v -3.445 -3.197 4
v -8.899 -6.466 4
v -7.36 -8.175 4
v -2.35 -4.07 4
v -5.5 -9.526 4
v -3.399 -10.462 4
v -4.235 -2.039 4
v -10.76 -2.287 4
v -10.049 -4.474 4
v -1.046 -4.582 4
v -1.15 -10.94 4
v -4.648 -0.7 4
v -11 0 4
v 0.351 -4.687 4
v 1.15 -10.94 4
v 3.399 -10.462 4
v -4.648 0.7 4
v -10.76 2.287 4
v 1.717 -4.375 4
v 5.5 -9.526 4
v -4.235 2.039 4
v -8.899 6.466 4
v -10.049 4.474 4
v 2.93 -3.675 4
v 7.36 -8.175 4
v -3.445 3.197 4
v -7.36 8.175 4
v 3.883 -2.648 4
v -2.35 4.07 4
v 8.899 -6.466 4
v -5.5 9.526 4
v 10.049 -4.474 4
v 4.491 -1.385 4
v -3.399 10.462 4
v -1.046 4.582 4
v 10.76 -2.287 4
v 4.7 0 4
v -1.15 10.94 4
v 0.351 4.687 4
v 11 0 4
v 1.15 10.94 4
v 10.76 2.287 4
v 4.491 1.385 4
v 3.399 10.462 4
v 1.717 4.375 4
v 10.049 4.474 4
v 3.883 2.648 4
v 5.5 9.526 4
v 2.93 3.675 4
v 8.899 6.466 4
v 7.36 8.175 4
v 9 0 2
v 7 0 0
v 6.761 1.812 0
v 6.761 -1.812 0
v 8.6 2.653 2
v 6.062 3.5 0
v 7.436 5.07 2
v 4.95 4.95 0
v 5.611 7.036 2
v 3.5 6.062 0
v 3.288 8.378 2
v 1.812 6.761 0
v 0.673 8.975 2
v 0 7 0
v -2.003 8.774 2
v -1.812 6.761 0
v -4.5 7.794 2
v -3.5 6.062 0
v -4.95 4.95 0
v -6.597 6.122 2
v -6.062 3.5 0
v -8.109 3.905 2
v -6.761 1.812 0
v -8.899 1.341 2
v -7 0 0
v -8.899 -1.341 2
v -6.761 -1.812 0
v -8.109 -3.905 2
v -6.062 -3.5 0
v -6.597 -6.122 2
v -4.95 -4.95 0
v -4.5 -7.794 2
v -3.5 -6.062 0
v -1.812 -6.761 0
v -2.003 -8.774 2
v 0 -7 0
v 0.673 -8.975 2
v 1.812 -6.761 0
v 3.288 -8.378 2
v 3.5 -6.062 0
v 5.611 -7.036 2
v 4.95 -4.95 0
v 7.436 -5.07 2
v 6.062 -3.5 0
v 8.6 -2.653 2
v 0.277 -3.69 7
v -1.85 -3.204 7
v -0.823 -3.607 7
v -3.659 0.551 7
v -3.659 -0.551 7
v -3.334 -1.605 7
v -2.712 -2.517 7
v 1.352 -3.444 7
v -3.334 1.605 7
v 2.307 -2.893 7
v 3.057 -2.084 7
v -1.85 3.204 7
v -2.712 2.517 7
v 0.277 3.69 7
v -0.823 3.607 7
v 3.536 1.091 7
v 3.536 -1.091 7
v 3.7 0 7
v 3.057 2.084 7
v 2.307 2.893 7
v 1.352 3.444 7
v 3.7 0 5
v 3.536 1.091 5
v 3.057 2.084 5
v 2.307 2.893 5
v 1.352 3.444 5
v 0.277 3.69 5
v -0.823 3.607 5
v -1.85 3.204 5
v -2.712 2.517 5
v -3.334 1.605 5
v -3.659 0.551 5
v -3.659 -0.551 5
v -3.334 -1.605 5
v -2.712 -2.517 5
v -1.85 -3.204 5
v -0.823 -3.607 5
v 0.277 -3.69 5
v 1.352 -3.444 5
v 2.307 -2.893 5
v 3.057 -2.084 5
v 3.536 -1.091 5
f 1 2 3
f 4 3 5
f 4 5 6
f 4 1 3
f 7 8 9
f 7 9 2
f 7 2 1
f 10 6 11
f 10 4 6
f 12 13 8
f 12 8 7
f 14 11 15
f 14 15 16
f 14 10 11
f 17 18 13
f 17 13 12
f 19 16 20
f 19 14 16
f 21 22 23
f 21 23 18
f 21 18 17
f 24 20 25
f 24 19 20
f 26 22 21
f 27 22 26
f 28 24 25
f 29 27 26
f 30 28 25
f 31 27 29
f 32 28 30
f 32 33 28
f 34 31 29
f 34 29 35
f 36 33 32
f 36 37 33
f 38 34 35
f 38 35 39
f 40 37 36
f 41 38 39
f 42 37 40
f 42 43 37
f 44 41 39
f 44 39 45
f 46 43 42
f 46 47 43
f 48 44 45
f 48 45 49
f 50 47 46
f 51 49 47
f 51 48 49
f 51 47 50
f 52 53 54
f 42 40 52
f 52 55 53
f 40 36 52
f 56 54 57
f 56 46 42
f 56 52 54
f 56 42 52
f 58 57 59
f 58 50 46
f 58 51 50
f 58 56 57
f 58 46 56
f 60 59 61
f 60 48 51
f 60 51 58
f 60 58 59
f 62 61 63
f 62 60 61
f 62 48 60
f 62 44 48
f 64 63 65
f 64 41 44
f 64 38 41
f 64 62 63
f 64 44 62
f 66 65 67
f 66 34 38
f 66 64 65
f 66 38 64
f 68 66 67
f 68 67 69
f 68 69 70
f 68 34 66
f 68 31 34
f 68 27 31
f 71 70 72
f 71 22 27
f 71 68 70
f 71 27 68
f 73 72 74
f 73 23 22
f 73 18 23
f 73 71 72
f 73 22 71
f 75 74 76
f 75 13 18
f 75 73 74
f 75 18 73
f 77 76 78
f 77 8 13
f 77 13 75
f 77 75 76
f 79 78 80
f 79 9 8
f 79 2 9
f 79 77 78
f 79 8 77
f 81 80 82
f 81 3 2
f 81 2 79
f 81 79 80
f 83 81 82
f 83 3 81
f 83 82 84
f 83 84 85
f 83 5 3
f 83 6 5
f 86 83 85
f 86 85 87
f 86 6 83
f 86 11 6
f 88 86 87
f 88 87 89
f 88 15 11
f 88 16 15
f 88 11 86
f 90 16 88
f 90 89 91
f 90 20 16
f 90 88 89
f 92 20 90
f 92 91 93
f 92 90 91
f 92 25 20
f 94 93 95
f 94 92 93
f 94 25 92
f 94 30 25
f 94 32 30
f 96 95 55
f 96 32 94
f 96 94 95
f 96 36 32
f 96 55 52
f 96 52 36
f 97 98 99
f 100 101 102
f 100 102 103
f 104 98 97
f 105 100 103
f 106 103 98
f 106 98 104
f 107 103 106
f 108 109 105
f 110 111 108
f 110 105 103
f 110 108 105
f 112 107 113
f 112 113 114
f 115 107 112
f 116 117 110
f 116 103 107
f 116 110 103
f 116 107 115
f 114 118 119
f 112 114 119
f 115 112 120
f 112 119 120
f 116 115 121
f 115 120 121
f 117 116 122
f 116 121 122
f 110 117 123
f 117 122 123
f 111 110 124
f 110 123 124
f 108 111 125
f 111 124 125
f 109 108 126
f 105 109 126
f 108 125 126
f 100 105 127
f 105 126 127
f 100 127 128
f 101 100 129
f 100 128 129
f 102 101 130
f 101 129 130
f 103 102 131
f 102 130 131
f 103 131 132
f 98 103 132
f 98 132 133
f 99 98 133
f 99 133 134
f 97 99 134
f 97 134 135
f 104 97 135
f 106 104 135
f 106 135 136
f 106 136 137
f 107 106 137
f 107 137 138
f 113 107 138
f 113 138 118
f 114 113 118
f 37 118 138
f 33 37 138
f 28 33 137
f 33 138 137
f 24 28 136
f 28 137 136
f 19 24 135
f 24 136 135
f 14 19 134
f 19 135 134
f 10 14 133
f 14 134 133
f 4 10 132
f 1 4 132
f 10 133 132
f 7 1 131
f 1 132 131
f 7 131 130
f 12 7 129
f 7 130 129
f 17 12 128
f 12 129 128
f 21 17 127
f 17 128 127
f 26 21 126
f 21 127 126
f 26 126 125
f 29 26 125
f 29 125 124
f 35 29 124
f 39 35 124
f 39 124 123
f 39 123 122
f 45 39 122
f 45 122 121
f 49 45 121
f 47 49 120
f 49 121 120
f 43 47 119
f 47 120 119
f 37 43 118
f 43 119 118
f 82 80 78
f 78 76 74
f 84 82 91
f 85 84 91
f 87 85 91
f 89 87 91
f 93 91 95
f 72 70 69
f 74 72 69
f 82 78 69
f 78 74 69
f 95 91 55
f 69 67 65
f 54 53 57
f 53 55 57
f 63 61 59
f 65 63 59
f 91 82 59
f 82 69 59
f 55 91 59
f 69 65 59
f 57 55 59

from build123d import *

# Parameters (mm, degrees)
F0_R     = 11
F0_R_2   = 3.7
F1_DEPTH = 4
F2_DEPTH = 7
F3_SIZE  = 3.99999
F4_SIZE  = 1


# Not quite as in the source:
# - a fillet or chamfer is up to 0.001 mm smaller than in the source, because OpenCascade refuses the exact size


with BuildPart() as f1:
    # F0 (on Top) → F1 (new body)
    with BuildSketch(Plane.XY):
        Circle(F0_R)
        Circle(F0_R_2, mode=Mode.SUBTRACT)
        Circle(F0_R_2)
    extrude(amount=F1_DEPTH)

    # F0 (on Top) → F2 (join)
    with BuildSketch(Plane.XY):
        Circle(F0_R_2)
    extrude(amount=F2_DEPTH)

    # F3 (size 4 in the source; OpenCascade refuses exactly that, so slightly less here)
    f3_edges = [f1.edges().sort_by_distance(p)[0] for p in [
        (-11, 0, 0),
    ]]
    chamfer(f3_edges, length=F3_SIZE)

    # F4
    f4_edges = [f1.edges().sort_by_distance(p)[0] for p in [
        (-3.7, 0, 4),
    ]]
    chamfer(f4_edges, length=F4_SIZE)


solid = f1.part
